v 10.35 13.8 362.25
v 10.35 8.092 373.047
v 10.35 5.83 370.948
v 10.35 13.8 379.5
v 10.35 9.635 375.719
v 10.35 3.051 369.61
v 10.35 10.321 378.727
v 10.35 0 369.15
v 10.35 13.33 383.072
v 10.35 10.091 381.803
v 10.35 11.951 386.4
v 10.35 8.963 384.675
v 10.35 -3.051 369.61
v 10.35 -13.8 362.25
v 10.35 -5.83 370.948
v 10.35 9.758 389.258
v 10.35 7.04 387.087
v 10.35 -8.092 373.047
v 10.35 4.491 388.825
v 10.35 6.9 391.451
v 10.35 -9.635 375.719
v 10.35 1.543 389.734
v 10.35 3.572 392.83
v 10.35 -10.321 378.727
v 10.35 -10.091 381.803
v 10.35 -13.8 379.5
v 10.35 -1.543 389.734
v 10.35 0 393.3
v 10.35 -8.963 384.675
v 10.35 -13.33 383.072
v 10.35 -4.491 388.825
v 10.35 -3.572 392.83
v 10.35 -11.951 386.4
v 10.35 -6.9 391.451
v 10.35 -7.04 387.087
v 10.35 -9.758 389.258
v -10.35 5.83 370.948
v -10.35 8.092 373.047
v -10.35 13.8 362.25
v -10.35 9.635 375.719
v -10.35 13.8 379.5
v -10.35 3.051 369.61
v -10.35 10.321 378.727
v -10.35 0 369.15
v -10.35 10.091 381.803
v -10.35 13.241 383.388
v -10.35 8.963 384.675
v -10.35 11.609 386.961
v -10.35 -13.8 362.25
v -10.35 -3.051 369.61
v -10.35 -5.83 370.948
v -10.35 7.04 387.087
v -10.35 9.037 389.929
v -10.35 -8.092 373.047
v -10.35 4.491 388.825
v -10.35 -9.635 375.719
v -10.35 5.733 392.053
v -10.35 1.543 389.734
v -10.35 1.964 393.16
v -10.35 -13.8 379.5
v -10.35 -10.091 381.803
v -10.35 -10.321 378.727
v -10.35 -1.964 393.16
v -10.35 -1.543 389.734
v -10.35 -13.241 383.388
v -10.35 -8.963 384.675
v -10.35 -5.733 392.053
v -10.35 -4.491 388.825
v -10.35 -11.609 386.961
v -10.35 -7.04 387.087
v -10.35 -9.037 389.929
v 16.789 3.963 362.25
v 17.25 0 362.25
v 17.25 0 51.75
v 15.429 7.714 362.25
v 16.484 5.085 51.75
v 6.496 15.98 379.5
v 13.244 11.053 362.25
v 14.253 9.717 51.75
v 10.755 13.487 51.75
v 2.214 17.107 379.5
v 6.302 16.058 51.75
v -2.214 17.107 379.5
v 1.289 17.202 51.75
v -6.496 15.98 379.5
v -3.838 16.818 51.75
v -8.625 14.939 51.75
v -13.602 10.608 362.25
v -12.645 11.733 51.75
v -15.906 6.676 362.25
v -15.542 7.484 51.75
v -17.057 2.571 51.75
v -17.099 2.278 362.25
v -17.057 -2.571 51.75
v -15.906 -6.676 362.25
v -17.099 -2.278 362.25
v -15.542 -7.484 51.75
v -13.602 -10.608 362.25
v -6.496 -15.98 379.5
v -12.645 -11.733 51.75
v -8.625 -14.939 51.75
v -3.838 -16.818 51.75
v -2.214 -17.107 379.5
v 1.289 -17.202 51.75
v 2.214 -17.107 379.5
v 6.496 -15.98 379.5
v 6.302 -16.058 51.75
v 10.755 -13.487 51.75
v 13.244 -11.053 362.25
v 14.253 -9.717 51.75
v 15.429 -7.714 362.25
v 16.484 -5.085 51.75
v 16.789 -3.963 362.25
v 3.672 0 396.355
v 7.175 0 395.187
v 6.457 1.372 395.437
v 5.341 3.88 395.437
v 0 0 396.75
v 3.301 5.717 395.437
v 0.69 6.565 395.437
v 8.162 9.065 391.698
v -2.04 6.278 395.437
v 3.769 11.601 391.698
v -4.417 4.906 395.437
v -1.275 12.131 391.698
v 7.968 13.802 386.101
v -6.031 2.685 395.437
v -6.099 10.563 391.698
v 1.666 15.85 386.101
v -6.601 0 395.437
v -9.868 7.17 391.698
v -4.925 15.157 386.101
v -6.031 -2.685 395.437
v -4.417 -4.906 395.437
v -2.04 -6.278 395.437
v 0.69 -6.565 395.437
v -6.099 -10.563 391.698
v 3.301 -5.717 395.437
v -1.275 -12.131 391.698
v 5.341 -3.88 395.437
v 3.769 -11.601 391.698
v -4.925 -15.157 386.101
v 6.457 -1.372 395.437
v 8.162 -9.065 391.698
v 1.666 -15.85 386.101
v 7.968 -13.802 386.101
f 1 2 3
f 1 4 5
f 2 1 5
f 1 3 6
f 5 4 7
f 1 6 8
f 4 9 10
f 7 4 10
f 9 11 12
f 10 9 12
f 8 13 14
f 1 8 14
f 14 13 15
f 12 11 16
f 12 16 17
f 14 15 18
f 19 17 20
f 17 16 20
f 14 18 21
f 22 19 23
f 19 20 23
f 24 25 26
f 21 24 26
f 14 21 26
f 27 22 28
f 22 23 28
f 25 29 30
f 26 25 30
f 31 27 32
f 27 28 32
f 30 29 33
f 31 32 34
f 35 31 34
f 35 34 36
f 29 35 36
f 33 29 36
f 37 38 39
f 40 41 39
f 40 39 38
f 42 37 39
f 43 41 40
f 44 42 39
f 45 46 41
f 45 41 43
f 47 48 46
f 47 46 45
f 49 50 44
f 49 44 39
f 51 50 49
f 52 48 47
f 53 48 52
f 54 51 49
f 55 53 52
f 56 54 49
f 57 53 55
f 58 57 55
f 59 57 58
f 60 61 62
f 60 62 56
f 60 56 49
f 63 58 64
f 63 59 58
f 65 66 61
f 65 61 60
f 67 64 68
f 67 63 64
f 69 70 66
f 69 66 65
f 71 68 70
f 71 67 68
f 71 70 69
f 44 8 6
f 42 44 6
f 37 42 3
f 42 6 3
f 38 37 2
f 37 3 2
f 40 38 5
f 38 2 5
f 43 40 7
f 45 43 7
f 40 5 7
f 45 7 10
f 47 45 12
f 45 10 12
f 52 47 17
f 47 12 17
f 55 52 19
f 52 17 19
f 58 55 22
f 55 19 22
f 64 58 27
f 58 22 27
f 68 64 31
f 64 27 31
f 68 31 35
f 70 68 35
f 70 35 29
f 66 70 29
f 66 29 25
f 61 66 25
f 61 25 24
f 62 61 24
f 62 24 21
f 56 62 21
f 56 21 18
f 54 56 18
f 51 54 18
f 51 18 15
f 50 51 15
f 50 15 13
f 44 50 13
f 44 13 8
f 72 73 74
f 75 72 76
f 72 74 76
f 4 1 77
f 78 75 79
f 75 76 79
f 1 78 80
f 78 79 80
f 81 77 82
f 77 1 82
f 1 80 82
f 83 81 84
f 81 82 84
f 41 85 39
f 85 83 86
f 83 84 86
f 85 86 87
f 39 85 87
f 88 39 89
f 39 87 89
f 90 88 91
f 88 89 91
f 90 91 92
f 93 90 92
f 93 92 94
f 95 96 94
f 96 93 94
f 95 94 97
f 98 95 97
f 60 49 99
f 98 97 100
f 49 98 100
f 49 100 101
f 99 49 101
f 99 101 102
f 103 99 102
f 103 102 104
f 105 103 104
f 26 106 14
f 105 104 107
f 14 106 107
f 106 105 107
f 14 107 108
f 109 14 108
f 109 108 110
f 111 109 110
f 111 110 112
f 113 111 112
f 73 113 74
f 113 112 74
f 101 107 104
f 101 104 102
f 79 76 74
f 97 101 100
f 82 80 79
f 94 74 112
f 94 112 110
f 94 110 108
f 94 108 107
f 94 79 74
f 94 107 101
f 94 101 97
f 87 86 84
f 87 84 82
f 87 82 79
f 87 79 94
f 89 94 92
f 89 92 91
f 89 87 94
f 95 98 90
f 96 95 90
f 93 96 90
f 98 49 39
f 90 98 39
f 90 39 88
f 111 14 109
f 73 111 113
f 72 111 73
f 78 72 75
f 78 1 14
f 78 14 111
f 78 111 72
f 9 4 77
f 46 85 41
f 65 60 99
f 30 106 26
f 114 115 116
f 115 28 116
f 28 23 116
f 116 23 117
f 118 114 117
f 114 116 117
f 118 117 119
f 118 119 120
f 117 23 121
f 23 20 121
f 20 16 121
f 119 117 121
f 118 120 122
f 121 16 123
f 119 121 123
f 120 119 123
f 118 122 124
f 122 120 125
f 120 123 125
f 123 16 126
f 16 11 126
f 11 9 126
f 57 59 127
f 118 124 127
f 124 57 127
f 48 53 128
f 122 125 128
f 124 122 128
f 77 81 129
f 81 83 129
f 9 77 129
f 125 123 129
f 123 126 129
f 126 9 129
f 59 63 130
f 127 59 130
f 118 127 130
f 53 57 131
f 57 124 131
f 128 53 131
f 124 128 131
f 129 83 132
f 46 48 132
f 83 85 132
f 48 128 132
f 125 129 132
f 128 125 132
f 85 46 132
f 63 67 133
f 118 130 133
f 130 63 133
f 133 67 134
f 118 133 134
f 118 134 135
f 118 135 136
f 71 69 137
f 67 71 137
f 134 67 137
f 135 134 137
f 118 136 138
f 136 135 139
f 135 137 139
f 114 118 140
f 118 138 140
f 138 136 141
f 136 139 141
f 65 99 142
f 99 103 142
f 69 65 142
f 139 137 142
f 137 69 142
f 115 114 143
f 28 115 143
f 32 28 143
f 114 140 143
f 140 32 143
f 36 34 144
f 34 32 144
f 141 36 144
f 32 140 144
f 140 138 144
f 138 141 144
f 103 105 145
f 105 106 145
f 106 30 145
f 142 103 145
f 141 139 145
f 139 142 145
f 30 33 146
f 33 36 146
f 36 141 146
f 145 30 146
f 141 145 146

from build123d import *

# Parameters (mm, degrees)
SKETCH_1_R          = 50
EXTRUDE_1_DEPTH     = 1150
CUT_EXTRUDE_1_DEPTH = 100
SKETCH_3_R          = 30
CUT_EXTRUDE_2_DEPTH = 100
SKETCH_4_R          = 50
CUT_EXTRUDE_3_DEPTH = 100
SKETCH_6_R          = 72.906400888
CUT_EXTRUDE_4_DEPTH = 50
SCALE_1_SCALE       = 0.345


with BuildPart() as part:
    # 草图1 → 凸台-拉伸1 (new body)
    with BuildSketch(Plane.XY):
        Circle(SKETCH_1_R)
    extrude(amount=EXTRUDE_1_DEPTH)

    # 草图2 → 切除-拉伸1 (cut)
    with BuildSketch(Plane.XY.offset(1150)):
        Polygon((-30, 50), (-30, -50), (-82.719574124, -32.427051987), (-69.504020862, 45.153140313), align=None)
        Polygon((30, 50), (30, -50), (70.972415669, -45.887337717), (95.445662451, 11.135327286), align=None)
    extrude(amount=-CUT_EXTRUDE_1_DEPTH, mode=Mode.SUBTRACT)

    # 草图3 → 切除-拉伸2 (cut)
    with BuildSketch(Plane(origin=(30, 0, 0), x_dir=(0, 0, -1), z_dir=(1, 0, 0))):
        with Locations((-1100, 0)):
            Circle(SKETCH_3_R)
    extrude(amount=-CUT_EXTRUDE_2_DEPTH, mode=Mode.SUBTRACT)

    # 圆角1: read off the stored shape, not the designer's step
    # 圆角1 outline → 圆角1 (revolve, cut)
    with BuildSketch(Plane.XZ):
        with BuildLine():
            ThreePointArc((0, 1150), (35.355339077, 1135.355339042), (50, 1099.99999995))
            Line((50, 1099.99999995), (50, 1150))
            Line((50, 1150), (0, 1150))
        make_face()
    revolve(axis=Axis((0, 0, 0), (0, 0, 1)), mode=Mode.SUBTRACT)

    # 草图4 → 切除-拉伸3 (cut)
    with BuildSketch(Plane(origin=(0, 0, 0), x_dir=(-1, 0, 0), z_dir=(0, 0, -1))):
        Circle(SKETCH_4_R)
    extrude(amount=-CUT_EXTRUDE_3_DEPTH, mode=Mode.SUBTRACT)

    # 草图6 → 切除-拉伸4 (cut)
    with BuildSketch(Plane(origin=(0, 0, 100), x_dir=(-1, 0, 0), z_dir=(0, 0, -1))):
        Circle(SKETCH_6_R)
    extrude(amount=-CUT_EXTRUDE_4_DEPTH, mode=Mode.SUBTRACT)


with BuildPart() as part_1:
    # 缩放比例1: scaled about (0, 0, 0)
    add(part.part.scale(SCALE_1_SCALE))


solid = part_1.part
